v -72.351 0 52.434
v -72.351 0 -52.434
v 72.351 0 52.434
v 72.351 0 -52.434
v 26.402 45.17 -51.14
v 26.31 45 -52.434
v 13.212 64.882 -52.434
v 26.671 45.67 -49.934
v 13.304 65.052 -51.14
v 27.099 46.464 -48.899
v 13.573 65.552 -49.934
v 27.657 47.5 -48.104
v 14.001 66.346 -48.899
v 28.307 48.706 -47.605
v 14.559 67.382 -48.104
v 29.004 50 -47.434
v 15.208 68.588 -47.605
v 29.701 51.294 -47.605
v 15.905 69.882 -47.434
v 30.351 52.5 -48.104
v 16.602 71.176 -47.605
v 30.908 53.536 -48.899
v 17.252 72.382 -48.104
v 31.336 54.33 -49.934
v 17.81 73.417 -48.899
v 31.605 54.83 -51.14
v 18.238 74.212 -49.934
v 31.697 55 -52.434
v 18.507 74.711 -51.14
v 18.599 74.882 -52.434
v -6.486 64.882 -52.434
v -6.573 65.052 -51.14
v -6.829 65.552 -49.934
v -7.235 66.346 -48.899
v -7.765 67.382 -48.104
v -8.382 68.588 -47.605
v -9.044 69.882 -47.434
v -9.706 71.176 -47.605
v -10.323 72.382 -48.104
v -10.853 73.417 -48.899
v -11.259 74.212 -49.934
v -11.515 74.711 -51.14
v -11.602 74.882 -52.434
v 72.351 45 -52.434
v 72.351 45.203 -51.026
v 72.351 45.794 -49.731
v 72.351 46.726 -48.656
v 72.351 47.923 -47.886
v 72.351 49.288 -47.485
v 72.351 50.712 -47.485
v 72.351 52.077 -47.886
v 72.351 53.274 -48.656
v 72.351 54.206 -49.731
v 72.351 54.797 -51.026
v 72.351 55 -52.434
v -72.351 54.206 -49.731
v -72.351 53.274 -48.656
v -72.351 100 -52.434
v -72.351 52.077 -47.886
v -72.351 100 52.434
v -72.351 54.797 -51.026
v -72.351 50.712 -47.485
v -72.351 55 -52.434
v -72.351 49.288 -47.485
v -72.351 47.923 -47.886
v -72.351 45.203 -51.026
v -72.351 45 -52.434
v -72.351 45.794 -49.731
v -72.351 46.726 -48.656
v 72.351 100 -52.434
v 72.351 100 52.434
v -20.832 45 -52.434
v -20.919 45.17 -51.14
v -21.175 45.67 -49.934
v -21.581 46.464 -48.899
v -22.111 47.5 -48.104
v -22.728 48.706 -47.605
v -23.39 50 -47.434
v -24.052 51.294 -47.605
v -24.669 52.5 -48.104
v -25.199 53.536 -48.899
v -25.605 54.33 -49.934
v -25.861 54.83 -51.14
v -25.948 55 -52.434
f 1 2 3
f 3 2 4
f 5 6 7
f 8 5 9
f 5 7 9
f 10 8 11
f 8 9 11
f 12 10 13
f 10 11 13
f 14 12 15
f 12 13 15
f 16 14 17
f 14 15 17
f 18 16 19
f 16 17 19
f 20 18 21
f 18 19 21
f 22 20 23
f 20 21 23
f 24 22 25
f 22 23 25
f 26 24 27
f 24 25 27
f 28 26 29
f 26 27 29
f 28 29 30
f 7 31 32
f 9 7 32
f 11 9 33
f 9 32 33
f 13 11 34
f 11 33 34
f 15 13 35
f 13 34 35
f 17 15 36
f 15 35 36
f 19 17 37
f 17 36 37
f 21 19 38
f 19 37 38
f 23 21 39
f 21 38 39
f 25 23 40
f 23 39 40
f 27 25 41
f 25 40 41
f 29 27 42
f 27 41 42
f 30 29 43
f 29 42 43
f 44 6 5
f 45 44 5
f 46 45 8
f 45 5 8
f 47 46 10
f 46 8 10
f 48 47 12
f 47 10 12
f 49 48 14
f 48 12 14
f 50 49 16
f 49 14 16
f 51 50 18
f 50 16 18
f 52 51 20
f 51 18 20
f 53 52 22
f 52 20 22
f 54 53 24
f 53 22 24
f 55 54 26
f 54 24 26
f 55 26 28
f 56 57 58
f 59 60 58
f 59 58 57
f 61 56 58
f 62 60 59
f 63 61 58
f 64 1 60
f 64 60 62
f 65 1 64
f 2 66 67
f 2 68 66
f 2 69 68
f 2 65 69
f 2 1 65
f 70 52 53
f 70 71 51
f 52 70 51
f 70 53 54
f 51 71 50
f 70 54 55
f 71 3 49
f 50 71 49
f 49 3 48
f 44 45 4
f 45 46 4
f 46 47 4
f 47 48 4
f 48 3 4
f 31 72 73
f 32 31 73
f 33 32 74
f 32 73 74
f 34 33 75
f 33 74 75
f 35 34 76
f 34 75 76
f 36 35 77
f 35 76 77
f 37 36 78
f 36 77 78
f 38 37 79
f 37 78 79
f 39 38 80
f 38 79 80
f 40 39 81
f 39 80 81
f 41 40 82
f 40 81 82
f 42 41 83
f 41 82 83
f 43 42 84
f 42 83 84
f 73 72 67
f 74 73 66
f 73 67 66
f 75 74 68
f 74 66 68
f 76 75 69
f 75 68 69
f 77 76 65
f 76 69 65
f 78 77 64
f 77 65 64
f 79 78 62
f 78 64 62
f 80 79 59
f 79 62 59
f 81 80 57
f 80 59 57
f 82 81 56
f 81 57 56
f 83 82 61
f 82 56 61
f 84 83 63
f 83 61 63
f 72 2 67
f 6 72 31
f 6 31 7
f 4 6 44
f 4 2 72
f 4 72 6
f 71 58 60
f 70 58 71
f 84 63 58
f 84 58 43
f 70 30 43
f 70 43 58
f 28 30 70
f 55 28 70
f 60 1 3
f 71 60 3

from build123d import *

# Parameters (mm, degrees)
SKETCH1_W            = 144.702517086
SKETCH1_H            = 104.868678114
BOSS_EXTRUDE5_DEPTH  = 100
CUT_SWEEP2_PROFILE_R = 5


with BuildPart() as part:
    # Sketch1 → Boss-Extrude5 (new body)
    with BuildSketch(Plane(origin=(0, 0, 0), x_dir=(1, 0, 0), z_dir=(0, 1, 0))):
        Rectangle(SKETCH1_W, SKETCH1_H)
    extrude(amount=BOSS_EXTRUDE5_DEPTH)

    # Cut-Sweep2: sweep along a path in Sketch14
    with BuildLine(Plane(origin=(0, 0, -52.434339057), x_dir=(-1, 0, 0), z_dir=(0, 0, -1))) as cut_sweep2_path:
        Line((-72.351258543, 50), (-29.003803048, 50))
        Line((-29.003803048, 50), (-15.905311349, 69.881639186))
        Line((-15.905311349, 69.881639186), (9.044196649, 69.881639186))
        Line((9.044196649, 69.881639186), (23.390163748, 50))
        Line((23.390163748, 50), (72.351258543, 50))
    # Cut-Sweep2 profile (on start of the path) → Cut-Sweep2 (sweep, cut)
    with BuildSketch(Plane(origin=(72.351258543, 50, -52.434339057), x_dir=(0, 0, -1), z_dir=(-1, 0, 0))):
        Circle(CUT_SWEEP2_PROFILE_R)
    sweep(path=cut_sweep2_path.line, transition=Transition.RIGHT, mode=Mode.SUBTRACT)


solid = part.part
